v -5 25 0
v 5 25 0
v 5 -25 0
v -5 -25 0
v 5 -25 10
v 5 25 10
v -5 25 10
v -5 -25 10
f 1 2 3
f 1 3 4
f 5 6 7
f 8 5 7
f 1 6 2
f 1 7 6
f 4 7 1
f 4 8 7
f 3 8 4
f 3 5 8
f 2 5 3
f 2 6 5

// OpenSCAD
linear_extrude(height = 10.0, twist = 0.0, scale = 1.0, slices = 1, center = false)
{
    scale([10.0, 50.0])
    {
        M53();
    }
}

module M53()
{
    polygon
    (
        points =
        [
            [-0.5, -0.5], 
            [0.5, -0.5], 
            [0.5, 0.5], 
            [-0.5, 0.5]
        ],
        paths =
        [
            [0, 1, 2, 3]
        ]
    );
}
